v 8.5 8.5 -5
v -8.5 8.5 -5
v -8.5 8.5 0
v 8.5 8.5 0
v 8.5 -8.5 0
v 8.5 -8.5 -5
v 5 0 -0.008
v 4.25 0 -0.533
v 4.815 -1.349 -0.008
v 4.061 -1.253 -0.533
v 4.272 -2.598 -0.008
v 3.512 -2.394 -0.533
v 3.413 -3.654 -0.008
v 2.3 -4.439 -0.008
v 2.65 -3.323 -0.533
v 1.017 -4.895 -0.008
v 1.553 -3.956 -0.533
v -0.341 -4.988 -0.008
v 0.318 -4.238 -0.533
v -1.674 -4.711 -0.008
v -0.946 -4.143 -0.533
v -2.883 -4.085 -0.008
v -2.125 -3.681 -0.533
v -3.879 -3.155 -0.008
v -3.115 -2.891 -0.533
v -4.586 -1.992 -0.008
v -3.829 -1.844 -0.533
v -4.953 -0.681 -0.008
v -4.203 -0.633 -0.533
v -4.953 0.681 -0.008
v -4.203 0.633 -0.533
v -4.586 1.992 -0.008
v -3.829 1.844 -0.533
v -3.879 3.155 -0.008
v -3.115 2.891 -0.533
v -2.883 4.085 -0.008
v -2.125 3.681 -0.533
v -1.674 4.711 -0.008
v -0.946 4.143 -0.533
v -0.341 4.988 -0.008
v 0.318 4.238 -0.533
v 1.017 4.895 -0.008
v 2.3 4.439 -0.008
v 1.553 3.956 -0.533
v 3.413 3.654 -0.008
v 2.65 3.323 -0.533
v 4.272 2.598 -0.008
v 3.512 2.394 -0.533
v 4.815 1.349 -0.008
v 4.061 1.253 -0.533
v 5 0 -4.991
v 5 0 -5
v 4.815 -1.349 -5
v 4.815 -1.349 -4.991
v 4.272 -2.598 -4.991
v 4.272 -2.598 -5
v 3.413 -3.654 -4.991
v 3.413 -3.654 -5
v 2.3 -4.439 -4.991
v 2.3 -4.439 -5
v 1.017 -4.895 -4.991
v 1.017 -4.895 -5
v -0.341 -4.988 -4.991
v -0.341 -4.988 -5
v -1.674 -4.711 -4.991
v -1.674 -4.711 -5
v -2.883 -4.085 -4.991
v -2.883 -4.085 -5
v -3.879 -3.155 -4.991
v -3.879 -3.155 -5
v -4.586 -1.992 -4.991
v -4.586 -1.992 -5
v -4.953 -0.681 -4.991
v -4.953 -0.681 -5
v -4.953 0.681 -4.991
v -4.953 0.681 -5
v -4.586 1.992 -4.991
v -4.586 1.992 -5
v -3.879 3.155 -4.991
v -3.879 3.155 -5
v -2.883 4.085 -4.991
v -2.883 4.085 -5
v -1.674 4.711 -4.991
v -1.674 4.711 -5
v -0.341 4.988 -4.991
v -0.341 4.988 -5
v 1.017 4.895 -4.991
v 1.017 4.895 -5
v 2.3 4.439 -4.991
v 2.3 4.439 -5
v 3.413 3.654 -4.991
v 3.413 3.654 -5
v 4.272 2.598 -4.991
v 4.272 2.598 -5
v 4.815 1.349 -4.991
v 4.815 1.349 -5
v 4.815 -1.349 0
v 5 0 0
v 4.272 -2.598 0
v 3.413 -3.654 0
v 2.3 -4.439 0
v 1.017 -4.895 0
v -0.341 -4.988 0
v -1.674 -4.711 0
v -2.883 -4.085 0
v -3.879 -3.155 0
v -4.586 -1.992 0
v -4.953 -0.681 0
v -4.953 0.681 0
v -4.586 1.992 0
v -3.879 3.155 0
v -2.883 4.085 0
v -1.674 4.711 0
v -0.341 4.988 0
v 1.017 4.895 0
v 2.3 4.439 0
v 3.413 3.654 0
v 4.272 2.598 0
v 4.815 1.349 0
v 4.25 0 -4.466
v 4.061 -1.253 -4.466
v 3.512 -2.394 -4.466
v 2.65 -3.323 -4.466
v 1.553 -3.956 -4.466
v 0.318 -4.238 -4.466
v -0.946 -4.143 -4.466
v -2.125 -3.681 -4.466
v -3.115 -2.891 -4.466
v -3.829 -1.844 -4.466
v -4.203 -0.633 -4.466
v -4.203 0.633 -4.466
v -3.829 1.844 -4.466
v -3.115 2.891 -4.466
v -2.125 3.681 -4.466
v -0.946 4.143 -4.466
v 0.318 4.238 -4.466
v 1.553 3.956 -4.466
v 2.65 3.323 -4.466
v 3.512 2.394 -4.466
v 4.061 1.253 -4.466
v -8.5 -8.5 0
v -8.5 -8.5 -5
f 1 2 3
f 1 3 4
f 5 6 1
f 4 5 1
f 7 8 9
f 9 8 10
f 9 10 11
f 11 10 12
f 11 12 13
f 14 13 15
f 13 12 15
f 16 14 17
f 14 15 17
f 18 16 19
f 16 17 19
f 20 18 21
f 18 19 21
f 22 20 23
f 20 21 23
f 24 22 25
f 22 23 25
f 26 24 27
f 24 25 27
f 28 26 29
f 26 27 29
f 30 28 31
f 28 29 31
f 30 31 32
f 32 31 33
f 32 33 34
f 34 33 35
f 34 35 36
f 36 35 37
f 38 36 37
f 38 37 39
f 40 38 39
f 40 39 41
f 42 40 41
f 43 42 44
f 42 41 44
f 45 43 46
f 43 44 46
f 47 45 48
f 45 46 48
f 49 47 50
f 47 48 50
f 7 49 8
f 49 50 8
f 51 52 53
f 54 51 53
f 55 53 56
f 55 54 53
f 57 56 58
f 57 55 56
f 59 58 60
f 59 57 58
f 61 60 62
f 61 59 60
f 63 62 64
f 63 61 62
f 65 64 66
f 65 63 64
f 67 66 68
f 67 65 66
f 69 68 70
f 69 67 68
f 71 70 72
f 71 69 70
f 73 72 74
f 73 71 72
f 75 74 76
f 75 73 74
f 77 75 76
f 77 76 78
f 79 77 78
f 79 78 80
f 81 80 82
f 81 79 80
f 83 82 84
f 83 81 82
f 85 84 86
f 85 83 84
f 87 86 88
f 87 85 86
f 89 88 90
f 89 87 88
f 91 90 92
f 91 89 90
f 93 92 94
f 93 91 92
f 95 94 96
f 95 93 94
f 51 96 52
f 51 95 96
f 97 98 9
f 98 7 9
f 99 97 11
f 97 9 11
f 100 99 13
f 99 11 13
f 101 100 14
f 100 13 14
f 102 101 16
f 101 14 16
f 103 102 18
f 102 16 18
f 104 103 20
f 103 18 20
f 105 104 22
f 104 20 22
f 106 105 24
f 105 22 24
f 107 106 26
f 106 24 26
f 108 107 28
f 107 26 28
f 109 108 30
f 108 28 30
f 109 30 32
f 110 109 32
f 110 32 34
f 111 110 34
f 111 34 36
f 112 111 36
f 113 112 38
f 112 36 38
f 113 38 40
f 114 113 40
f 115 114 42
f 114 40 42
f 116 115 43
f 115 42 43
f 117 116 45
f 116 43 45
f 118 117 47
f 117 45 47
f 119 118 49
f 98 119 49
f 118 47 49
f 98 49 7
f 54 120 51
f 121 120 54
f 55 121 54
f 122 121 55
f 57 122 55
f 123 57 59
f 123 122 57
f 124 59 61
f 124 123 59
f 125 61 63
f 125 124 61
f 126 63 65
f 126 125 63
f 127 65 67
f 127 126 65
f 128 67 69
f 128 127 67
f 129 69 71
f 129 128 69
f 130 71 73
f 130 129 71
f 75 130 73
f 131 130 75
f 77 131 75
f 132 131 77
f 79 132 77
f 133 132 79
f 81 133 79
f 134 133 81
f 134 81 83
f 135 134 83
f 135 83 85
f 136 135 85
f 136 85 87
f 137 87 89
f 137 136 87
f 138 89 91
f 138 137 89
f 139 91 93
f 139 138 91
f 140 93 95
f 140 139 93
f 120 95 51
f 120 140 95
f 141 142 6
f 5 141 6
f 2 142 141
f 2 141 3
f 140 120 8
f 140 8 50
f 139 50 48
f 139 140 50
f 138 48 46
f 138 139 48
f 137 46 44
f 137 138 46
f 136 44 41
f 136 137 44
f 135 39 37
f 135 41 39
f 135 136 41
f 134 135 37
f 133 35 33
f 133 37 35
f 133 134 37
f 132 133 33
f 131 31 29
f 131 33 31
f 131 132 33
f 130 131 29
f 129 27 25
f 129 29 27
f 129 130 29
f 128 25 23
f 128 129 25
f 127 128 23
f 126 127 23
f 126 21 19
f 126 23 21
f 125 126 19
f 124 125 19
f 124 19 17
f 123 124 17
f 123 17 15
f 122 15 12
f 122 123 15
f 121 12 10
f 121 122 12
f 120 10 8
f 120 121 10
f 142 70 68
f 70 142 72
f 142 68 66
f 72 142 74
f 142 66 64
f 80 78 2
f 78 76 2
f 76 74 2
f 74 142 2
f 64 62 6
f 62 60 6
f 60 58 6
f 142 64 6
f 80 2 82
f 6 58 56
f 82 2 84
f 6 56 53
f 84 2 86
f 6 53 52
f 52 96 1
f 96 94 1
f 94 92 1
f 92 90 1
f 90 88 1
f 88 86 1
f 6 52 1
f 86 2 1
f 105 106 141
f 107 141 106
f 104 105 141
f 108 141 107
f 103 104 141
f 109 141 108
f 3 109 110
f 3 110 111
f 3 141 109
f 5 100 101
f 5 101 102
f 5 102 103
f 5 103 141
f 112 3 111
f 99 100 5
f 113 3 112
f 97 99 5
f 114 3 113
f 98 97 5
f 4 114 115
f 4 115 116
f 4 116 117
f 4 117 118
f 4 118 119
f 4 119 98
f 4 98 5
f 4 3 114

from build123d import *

# Parameters (mm, degrees)
BASENUT_START = -5
BASENUTSKE_W  = 17
BASENUTSKE_H  = 17
BASENUTSKE_R  = 4.25
BASENUT_DEPTH = 5


with BuildPart() as part:
    # BaseNutSke → BaseNut (new body)
    with BuildSketch(Plane.XY.offset(BASENUT_START)):
        Rectangle(BASENUTSKE_W, BASENUTSKE_H)
        Circle(BASENUTSKE_R, mode=Mode.SUBTRACT)
    extrude(amount=BASENUT_DEPTH)

    # EndChamferSketch → EndChamfer (revolve, cut)
    with BuildSketch(Plane(origin=(0, 0, 0), x_dir=(0, 0, -1), z_dir=(1, 0, 0)), mode=Mode.PRIVATE) as endchamfer_sk:
        Polygon((4.991, 5), (4.413328781, 4.175), (5.001, 4.175), (5.001, 5), align=None)
        Polygon((-0.002, 5), (0.008, 5), (0.585671219, 4.175), (-0.002, 4.175), align=None)
    revolve(endchamfer_sk.sketch.rotate(Axis((0, 0, -25.037505729), (0, 0, -1)), 90), axis=Axis((0, 0, -25.037505729), (0, 0, -1)), mode=Mode.SUBTRACT)


solid = part.part
